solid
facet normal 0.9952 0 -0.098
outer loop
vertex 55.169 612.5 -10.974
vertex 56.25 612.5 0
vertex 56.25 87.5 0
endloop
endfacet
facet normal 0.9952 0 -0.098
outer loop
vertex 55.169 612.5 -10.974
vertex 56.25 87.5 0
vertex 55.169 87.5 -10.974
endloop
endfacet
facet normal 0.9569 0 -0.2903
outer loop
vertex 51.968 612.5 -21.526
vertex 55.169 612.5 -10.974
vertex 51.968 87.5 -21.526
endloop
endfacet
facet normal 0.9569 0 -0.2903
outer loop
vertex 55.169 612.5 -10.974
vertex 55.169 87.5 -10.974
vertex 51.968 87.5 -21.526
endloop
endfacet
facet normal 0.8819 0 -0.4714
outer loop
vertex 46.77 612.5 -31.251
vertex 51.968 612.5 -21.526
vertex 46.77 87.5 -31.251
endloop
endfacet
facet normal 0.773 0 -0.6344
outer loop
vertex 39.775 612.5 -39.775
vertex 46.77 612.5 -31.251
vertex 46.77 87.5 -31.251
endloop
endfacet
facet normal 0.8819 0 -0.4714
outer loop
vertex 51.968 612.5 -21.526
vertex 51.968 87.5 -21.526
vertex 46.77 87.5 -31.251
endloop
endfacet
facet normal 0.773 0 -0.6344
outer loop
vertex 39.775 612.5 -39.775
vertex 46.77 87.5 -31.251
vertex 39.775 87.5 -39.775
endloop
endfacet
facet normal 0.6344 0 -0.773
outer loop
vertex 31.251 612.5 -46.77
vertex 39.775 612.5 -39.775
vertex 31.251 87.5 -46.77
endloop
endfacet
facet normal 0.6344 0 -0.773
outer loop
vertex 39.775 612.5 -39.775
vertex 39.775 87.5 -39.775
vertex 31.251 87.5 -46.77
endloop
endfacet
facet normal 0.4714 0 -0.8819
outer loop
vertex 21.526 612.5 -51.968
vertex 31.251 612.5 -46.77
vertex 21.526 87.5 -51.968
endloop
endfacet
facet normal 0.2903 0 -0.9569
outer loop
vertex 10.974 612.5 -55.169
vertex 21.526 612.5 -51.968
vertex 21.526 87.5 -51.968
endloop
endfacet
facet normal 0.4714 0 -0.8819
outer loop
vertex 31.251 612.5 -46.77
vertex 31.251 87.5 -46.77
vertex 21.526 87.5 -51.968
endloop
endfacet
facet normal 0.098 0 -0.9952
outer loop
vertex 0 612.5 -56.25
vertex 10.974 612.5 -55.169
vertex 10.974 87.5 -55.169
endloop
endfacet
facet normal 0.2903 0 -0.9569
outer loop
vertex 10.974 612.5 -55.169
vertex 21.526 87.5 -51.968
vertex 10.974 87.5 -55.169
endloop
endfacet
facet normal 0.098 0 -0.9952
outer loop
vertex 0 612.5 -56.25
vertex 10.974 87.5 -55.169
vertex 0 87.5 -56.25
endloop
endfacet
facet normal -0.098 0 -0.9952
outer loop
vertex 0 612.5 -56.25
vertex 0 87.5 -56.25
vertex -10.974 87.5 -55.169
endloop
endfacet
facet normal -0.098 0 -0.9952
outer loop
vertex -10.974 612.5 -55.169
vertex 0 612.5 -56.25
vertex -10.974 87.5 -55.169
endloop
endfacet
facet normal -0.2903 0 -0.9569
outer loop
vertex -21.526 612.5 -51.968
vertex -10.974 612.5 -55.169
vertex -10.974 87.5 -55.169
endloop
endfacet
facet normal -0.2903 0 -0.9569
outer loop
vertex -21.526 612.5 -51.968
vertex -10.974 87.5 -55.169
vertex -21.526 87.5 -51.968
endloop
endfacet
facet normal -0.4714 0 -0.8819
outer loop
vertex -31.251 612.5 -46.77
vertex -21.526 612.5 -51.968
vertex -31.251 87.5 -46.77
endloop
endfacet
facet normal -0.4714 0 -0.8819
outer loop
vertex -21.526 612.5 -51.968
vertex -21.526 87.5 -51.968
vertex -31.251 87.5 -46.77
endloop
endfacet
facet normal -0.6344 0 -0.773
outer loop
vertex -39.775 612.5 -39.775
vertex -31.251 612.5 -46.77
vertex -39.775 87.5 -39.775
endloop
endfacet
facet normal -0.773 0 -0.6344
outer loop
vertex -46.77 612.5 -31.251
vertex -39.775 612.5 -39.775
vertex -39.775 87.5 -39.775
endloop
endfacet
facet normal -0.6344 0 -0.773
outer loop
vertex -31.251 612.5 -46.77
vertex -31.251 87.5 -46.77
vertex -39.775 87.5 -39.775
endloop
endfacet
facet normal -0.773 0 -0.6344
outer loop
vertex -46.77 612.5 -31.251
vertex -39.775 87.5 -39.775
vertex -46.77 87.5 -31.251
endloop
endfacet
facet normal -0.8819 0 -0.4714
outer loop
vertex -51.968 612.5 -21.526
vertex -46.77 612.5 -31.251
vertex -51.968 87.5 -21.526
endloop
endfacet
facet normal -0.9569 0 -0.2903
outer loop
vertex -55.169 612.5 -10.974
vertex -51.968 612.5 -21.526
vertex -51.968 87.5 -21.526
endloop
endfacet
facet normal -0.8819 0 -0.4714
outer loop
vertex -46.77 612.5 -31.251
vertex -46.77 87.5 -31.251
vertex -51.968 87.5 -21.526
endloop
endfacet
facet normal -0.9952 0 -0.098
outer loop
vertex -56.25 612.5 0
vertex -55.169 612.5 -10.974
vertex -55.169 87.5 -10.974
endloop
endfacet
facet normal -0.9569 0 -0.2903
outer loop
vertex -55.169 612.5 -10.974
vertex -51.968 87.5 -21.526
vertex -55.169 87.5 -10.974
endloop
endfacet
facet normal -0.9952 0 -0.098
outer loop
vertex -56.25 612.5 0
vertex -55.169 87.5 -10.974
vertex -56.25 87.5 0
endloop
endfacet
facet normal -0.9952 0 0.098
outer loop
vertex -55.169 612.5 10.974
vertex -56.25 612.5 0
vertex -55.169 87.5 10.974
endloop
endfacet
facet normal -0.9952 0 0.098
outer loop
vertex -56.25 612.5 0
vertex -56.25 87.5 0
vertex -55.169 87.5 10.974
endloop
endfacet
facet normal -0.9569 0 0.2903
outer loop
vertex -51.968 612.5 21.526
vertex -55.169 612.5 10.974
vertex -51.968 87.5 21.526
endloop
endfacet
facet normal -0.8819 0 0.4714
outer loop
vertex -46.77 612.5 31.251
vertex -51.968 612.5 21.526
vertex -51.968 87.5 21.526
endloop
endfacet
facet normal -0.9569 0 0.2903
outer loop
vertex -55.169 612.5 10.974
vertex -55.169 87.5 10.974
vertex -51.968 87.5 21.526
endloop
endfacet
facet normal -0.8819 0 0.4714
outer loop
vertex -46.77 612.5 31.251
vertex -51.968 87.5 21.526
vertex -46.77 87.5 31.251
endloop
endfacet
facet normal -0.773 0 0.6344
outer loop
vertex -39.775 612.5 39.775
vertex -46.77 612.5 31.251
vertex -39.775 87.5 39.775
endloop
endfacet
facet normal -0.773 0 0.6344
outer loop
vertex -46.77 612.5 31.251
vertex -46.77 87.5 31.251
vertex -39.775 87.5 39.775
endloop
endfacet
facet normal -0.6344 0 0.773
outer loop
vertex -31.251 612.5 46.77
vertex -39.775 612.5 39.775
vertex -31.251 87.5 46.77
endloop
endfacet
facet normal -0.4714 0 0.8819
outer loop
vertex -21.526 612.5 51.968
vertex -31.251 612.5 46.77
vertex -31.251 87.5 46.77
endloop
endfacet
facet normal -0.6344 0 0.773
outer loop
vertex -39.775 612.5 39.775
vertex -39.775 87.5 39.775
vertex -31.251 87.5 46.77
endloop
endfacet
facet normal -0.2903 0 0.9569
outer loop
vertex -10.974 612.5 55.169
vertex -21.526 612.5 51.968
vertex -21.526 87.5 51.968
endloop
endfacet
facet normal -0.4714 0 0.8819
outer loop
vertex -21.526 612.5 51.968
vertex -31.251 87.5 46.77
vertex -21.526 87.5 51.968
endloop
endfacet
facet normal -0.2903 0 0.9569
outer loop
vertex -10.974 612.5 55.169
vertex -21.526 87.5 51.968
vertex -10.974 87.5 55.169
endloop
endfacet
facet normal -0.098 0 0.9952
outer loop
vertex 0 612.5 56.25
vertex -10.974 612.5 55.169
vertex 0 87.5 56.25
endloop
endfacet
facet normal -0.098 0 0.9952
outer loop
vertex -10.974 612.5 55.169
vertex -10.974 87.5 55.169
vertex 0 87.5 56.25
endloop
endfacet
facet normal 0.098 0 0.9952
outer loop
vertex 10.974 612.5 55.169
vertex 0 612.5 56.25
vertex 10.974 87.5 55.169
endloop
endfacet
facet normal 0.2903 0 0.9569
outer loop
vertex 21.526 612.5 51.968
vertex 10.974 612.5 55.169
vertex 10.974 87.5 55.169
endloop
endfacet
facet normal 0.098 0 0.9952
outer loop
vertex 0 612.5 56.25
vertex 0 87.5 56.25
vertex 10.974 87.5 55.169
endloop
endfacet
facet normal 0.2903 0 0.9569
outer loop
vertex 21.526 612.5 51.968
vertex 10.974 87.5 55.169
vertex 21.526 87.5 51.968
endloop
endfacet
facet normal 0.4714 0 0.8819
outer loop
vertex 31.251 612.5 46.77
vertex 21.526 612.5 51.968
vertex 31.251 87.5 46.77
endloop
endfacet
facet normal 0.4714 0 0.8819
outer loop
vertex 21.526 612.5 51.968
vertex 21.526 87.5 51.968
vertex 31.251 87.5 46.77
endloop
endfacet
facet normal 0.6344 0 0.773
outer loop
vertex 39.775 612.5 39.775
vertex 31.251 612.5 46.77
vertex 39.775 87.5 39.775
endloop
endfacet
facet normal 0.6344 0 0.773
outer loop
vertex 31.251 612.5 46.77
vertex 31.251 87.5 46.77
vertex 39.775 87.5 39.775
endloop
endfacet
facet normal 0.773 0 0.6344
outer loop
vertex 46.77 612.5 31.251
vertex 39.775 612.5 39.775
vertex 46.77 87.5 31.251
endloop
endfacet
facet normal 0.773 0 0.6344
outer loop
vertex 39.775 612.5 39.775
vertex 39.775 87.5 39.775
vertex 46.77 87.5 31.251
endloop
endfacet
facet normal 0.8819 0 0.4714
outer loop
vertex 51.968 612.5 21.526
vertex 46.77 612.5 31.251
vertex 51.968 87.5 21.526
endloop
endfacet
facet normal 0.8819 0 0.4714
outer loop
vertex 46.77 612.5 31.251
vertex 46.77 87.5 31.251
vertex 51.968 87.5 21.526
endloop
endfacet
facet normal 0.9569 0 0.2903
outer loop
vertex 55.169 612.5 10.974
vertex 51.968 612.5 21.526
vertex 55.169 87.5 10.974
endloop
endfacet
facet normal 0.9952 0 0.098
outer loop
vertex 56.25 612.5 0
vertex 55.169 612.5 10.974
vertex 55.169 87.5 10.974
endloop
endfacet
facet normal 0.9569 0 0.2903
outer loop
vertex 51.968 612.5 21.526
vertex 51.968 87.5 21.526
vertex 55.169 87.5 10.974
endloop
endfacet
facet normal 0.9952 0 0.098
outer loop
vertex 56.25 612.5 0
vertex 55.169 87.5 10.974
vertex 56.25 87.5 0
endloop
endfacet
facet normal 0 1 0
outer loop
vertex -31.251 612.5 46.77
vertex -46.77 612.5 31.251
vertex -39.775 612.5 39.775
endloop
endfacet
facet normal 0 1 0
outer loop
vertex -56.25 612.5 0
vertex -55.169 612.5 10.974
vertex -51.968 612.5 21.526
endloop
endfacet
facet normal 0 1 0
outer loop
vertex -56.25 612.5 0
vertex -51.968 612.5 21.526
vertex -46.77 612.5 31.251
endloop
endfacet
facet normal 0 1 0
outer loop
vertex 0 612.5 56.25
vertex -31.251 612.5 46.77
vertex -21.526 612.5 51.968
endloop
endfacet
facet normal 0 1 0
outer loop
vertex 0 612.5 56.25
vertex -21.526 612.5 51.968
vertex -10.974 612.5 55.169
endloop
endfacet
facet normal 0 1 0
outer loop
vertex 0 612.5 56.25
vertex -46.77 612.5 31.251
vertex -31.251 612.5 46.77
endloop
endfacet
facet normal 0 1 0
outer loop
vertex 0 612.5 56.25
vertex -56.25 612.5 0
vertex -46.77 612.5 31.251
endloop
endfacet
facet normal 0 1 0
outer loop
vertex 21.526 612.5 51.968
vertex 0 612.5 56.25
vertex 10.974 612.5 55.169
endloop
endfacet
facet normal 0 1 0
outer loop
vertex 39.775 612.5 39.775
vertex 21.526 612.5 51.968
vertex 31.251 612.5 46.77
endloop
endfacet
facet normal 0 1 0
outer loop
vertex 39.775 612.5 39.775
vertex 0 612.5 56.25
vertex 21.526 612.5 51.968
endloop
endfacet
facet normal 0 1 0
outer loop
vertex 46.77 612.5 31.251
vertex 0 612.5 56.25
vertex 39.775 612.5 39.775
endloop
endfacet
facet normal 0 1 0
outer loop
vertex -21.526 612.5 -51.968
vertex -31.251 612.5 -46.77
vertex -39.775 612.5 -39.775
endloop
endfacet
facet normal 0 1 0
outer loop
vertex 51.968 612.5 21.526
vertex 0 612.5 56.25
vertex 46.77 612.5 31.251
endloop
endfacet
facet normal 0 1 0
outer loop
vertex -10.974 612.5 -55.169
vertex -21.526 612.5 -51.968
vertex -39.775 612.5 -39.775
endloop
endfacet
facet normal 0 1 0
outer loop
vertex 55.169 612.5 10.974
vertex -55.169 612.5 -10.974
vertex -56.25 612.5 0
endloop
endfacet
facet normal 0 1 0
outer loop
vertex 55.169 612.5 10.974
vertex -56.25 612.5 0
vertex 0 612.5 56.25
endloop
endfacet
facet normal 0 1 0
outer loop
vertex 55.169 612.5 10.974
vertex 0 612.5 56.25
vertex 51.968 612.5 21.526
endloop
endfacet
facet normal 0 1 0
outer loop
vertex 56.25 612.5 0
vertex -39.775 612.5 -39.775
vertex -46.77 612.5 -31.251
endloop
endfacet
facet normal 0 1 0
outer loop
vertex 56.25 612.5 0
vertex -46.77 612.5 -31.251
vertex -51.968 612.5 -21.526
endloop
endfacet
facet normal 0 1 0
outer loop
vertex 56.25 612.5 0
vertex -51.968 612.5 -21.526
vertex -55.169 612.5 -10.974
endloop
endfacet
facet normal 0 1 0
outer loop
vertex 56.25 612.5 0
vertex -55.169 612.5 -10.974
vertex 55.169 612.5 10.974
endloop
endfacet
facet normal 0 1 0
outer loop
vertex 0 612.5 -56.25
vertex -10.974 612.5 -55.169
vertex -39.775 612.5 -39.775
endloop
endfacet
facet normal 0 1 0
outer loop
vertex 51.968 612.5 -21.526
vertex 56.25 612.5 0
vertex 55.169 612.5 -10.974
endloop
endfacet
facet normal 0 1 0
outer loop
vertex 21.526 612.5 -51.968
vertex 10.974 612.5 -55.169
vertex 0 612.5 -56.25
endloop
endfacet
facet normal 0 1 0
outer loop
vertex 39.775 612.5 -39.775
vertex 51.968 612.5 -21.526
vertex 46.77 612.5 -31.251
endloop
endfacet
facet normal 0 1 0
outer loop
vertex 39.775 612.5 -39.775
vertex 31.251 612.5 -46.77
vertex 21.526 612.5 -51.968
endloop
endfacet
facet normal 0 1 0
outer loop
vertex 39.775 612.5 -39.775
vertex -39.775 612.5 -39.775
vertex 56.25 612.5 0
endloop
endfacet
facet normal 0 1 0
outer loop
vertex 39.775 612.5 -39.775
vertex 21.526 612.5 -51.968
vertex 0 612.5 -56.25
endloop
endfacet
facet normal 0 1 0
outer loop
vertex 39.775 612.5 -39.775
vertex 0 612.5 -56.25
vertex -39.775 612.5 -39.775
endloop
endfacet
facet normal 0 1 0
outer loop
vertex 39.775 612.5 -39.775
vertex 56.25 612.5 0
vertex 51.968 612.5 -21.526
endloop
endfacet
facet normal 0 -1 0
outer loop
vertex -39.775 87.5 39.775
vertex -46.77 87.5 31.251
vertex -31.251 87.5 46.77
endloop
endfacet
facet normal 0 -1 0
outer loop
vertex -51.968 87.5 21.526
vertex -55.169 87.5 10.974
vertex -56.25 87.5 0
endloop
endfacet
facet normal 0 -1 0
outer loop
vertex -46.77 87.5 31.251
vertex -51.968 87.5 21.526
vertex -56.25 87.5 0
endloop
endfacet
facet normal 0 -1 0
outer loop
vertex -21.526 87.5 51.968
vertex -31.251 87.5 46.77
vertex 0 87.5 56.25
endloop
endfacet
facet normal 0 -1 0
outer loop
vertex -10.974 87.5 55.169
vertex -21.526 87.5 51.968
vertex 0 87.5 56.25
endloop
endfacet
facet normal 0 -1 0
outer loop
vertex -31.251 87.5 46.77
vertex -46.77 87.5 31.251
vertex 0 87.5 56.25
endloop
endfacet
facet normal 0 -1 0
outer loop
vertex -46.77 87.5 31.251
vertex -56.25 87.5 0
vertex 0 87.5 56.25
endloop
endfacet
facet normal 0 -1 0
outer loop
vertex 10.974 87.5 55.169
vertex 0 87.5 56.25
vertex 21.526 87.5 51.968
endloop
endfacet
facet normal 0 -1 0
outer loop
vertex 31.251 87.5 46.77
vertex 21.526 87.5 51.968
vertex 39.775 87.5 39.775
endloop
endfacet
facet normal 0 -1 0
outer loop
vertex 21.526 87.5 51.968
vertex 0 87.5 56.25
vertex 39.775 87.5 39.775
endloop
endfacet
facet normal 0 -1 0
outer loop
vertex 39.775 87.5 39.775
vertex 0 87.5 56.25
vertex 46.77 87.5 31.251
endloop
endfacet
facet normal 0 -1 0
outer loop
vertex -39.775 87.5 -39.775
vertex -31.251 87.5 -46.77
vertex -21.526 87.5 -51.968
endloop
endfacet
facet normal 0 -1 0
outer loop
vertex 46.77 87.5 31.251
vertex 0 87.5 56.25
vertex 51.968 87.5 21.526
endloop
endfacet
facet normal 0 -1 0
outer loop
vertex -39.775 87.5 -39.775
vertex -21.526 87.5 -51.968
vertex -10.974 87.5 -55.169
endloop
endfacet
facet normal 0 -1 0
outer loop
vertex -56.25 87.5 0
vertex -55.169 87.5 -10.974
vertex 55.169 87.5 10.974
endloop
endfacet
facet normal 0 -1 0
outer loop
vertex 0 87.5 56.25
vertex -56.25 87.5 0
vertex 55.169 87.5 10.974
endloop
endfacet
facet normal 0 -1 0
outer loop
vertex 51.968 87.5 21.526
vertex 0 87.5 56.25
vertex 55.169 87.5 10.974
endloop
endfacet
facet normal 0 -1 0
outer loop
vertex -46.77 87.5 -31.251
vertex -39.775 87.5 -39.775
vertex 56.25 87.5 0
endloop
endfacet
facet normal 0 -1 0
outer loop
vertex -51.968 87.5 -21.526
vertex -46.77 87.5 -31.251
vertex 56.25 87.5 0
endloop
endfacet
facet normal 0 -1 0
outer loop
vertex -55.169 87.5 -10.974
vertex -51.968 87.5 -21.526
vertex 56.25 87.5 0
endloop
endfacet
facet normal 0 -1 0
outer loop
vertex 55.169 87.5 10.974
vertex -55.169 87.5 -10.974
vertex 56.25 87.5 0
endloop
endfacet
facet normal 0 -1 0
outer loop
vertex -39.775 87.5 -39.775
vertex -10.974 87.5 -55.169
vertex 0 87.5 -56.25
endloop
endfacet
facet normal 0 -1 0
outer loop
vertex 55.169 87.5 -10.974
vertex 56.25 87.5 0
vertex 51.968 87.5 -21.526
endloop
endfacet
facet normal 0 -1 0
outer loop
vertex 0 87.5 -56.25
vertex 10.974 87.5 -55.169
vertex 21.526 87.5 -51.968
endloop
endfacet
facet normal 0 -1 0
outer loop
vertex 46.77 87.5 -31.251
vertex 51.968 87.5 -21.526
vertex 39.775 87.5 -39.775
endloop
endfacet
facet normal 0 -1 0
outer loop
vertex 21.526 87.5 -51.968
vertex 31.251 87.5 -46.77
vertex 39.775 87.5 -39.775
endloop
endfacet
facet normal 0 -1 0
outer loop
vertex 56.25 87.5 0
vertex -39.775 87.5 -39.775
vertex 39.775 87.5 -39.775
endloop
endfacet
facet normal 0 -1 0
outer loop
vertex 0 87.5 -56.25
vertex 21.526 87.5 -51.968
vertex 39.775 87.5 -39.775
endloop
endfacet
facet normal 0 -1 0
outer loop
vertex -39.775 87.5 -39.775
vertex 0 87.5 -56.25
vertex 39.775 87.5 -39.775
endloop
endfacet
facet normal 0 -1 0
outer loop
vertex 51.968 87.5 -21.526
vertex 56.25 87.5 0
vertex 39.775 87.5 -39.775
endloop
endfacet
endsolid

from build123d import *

# Parameters (mm, degrees)
SKETCH1_R           = 7.5
BOSS_EXTRUDE1_DEPTH = 70
SCALE1_SCALE        = 10
SCALE2_SCALE        = 0.75


with BuildPart() as part:
    # Sketch1 → Boss-Extrude1 (new body)
    with BuildSketch(Plane(origin=(0, 0, 0), x_dir=(1, 0, 0), z_dir=(0, 1, 0))):
        Circle(SKETCH1_R)
    extrude(amount=BOSS_EXTRUDE1_DEPTH)


with BuildPart() as part_1:
    # Scale1: scaled about (0, 0, 0)
    add(part.part.scale(SCALE1_SCALE))


with BuildPart() as part_2:
    # Scale2: scaled about (0, 350, 0)
    add(part_1.part.scale(SCALE2_SCALE).moved(Location((0, 87.5, 0))))


solid = part_2.part
